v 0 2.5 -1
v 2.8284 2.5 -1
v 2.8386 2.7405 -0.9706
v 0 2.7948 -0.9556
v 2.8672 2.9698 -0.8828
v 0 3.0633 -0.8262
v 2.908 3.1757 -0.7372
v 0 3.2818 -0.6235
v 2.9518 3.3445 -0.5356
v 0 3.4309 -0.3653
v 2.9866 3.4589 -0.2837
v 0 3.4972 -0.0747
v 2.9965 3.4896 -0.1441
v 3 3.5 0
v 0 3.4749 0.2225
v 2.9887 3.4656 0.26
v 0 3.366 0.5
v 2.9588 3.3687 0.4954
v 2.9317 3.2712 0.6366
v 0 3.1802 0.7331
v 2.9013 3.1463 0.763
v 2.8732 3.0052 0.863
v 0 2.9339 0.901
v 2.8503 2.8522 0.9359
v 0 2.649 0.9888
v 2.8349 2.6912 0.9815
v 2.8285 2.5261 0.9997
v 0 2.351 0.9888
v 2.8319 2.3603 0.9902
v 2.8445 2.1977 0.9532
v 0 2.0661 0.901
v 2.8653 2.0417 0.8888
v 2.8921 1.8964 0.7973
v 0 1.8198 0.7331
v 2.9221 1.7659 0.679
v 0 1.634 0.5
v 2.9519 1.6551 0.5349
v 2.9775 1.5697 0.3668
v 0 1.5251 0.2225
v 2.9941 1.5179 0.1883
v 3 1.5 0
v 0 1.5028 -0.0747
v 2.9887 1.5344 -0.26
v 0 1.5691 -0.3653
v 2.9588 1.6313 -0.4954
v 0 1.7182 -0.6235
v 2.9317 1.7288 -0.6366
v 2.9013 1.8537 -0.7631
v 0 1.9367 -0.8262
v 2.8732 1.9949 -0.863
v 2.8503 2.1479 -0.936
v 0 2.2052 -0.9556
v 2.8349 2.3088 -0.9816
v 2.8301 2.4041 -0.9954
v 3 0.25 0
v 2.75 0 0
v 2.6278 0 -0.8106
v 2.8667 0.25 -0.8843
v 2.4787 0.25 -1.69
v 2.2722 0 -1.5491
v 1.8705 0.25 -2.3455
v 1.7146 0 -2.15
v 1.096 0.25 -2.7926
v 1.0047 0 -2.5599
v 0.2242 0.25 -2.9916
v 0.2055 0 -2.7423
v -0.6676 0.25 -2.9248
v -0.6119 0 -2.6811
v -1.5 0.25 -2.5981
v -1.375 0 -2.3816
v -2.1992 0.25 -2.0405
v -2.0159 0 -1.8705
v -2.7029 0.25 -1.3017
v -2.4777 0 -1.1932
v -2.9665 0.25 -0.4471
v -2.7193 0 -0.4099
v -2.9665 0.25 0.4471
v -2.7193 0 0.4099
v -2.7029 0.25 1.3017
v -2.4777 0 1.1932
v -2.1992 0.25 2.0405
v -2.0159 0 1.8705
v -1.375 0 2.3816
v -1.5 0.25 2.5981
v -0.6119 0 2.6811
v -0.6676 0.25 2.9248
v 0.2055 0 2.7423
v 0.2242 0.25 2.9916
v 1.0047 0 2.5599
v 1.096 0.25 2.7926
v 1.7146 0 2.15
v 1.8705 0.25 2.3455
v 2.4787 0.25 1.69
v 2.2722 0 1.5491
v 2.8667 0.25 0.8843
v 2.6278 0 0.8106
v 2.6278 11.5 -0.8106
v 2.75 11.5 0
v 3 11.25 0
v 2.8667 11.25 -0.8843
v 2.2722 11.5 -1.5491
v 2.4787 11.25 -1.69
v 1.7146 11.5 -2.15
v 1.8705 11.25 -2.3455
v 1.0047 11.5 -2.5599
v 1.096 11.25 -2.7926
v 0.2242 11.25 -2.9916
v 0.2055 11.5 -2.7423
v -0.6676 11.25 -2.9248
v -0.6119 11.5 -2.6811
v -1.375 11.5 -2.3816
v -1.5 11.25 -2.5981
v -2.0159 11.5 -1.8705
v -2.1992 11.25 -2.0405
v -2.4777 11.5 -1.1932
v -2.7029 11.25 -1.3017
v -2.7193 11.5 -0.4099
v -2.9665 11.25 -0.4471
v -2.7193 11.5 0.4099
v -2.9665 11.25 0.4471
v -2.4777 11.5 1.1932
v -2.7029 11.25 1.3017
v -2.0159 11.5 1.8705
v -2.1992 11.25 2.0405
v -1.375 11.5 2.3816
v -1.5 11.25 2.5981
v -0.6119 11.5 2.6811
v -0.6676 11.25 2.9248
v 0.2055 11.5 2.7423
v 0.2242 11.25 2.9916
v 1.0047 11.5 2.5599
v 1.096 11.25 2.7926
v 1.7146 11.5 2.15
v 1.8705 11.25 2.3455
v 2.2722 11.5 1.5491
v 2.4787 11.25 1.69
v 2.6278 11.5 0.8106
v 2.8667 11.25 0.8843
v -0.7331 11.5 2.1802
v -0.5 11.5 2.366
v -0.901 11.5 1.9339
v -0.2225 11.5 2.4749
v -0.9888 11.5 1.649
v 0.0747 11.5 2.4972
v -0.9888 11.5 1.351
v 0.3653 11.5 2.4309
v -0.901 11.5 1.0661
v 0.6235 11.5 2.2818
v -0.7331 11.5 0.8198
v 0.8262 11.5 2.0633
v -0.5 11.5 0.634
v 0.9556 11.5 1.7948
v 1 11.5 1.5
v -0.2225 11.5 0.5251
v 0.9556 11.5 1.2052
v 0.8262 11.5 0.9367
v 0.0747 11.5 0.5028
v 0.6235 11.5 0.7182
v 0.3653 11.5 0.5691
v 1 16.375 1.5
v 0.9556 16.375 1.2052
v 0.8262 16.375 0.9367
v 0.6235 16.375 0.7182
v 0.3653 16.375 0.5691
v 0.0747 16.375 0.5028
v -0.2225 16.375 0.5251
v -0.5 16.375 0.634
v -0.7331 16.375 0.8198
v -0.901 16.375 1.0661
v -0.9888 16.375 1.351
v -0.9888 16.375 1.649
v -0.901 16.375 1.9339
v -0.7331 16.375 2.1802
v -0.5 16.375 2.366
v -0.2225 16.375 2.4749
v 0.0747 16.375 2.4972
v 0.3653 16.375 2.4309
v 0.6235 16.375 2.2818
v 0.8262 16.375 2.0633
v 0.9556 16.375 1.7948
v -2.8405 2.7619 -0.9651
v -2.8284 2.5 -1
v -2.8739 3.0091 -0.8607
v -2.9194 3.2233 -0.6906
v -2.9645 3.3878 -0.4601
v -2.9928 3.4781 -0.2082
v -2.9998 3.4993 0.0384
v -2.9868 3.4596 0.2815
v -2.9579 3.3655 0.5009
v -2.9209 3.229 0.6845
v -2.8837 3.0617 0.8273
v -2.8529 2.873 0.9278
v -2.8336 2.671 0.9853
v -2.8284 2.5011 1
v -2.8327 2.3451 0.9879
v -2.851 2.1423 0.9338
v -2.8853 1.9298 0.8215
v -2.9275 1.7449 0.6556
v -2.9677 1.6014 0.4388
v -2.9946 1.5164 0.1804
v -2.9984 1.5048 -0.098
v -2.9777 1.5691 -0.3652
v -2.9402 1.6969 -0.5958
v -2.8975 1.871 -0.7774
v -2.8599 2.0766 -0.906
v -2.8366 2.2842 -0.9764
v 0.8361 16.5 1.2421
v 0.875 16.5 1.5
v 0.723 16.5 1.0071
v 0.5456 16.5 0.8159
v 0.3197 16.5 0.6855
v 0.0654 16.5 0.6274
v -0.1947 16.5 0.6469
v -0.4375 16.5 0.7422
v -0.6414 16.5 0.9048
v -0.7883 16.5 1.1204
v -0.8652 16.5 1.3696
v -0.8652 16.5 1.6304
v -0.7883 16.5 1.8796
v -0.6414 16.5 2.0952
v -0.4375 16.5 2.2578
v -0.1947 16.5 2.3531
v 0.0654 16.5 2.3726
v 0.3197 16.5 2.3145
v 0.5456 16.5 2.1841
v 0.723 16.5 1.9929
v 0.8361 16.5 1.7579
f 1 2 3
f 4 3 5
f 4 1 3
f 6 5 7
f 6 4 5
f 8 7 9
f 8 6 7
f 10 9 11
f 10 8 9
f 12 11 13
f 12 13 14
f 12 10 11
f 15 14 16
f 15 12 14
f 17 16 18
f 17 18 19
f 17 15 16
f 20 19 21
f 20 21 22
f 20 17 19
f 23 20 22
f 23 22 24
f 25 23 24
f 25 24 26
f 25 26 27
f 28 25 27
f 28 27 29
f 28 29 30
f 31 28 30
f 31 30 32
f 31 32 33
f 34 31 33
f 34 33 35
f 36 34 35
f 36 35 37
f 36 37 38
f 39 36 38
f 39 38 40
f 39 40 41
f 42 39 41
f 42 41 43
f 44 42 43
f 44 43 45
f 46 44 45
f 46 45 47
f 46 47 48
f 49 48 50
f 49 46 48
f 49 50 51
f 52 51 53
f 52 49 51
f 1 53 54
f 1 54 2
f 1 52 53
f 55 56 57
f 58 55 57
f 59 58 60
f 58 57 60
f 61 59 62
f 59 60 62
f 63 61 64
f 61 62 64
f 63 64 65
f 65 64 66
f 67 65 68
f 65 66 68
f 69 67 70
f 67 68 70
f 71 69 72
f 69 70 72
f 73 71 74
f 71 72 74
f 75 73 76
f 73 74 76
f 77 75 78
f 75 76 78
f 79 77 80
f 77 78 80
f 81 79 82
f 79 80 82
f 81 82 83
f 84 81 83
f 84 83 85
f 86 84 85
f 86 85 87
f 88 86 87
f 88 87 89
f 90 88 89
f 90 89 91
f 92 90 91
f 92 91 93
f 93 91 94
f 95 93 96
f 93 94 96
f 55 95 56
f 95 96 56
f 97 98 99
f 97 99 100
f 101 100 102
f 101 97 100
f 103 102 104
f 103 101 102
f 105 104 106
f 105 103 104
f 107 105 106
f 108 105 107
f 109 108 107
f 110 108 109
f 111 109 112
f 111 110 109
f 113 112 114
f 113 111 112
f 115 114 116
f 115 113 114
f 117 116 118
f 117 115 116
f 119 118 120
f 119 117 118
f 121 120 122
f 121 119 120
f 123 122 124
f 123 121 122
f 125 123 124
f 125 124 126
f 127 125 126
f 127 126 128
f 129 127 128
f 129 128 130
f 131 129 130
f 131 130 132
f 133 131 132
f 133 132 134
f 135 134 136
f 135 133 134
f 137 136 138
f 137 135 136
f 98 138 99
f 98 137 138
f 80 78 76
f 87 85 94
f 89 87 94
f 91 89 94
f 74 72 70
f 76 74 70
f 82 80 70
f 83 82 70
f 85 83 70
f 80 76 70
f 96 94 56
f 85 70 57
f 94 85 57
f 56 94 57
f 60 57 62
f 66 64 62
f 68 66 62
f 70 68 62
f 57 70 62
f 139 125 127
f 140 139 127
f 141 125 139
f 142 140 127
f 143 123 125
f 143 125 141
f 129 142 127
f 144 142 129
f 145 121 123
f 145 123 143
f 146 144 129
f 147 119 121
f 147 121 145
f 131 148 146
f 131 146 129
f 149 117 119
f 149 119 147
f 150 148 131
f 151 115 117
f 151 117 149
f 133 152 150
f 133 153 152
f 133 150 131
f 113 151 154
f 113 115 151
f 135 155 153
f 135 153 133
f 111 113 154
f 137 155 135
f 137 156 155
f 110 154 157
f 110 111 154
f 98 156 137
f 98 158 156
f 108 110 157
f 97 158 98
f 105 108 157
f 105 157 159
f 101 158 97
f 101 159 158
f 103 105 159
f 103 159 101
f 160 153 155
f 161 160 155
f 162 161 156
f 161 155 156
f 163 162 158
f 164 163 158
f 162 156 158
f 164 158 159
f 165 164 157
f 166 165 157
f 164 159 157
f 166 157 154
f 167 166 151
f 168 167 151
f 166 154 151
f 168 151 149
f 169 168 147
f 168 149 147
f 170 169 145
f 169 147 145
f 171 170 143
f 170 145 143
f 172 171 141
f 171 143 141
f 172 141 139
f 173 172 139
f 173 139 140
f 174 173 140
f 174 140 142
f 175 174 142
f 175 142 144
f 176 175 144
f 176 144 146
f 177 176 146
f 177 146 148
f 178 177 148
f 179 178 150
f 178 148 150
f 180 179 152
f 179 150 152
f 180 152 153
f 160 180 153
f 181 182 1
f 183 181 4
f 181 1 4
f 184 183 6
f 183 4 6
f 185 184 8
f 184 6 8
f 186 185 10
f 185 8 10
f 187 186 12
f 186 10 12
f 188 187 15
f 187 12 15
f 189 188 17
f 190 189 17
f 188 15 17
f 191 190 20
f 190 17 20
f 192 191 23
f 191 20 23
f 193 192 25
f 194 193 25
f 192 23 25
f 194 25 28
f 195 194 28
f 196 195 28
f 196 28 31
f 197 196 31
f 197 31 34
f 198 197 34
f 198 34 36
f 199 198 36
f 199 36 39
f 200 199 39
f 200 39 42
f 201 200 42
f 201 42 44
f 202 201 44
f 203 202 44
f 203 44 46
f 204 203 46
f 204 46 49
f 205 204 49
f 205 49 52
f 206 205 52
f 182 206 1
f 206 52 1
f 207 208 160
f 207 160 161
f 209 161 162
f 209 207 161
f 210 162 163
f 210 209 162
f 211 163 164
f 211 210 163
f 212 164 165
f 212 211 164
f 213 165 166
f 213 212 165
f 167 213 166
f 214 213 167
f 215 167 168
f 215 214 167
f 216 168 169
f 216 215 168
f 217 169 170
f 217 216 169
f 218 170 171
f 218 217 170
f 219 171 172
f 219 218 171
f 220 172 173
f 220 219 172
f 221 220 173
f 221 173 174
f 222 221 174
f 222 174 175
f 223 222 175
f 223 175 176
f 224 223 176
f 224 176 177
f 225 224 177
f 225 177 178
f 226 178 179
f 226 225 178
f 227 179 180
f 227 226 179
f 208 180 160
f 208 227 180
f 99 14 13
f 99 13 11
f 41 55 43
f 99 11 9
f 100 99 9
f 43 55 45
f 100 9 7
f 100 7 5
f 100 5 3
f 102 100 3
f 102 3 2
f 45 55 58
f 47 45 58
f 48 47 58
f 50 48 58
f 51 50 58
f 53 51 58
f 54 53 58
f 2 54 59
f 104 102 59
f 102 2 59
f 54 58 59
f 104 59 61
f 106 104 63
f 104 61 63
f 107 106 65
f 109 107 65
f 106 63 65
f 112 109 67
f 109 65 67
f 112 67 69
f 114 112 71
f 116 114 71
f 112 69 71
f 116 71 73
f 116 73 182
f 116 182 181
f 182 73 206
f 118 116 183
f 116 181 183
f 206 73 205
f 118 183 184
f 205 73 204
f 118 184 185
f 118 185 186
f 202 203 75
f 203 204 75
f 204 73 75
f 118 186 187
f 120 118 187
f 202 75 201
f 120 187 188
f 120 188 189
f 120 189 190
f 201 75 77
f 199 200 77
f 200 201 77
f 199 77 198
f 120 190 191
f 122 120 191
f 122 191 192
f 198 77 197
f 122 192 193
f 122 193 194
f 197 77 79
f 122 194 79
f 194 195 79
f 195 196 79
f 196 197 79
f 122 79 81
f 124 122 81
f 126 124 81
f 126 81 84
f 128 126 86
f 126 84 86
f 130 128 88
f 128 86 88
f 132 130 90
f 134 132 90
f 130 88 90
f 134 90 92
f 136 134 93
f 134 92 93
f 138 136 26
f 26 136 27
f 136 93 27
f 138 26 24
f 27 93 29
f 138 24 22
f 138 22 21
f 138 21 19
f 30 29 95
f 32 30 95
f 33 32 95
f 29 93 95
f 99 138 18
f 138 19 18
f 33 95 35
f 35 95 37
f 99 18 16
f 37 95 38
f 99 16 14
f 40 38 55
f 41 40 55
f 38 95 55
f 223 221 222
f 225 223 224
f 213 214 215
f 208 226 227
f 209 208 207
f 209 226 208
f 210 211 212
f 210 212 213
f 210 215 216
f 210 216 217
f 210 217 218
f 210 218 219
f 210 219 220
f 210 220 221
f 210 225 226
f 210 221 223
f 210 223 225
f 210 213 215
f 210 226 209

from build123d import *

# Parameters (mm, degrees)
SKETCH1_R               = 3
BOSS_EXTRUDE1_DEPTH     = 11.5
SKETCH4_R               = 1
BOSS_EXTRUDE2_DEPTH     = 5
SKETCH9_R               = 1
CUT_EXTRUDE1_DEPTH      = 4
CUT_EXTRUDE1_DEPTH_BACK = 4
CHAMFER1_SIZE           = 0.25
CHAMFER2_SIZE           = 0.25
CHAMFER3_SIZE           = 0.125


with BuildPart() as part:
    # Sketch1 → Boss-Extrude1 (new body)
    with BuildSketch(Plane(origin=(0, 0, 0), x_dir=(1, 0, 0), z_dir=(0, 1, 0))):
        Circle(SKETCH1_R)
    extrude(amount=BOSS_EXTRUDE1_DEPTH)

    # Sketch4 → Boss-Extrude2 (add)
    with BuildSketch(Plane(origin=(0, 11.5, 0), x_dir=(1, 0, 0), z_dir=(0, 1, 0))):
        with Locations((0, -1.5)):
            Circle(SKETCH4_R)
    extrude(amount=BOSS_EXTRUDE2_DEPTH)

    # Sketch9 → Cut-Extrude1 (cut, two sides)
    with BuildSketch(Plane(origin=(0, 0, 0), x_dir=(0, 0, -1), z_dir=(1, 0, 0))) as cut_extrude1_sk:
        with Locations((0, 2.5)):
            Circle(SKETCH9_R)
    extrude(amount=CUT_EXTRUDE1_DEPTH, mode=Mode.SUBTRACT)
    extrude(cut_extrude1_sk.sketch, amount=-CUT_EXTRUDE1_DEPTH_BACK, mode=Mode.SUBTRACT)

    # Chamfer1
    chamfer1_edges = [part.edges().sort_by_distance(p)[0] for p in [
        (-3, 11.5, 0),
    ]]
    chamfer(chamfer1_edges, length=CHAMFER1_SIZE)

    # Chamfer2
    chamfer2_edges = [part.edges().sort_by_distance(p)[0] for p in [
        (-3, 0, 0),
    ]]
    chamfer(chamfer2_edges, length=CHAMFER2_SIZE)

    # Chamfer3
    chamfer3_edges = [part.edges().sort_by_distance(p)[0] for p in [
        (-1, 16.5, 1.5),
    ]]
    chamfer(chamfer3_edges, length=CHAMFER3_SIZE)


solid = part.part
